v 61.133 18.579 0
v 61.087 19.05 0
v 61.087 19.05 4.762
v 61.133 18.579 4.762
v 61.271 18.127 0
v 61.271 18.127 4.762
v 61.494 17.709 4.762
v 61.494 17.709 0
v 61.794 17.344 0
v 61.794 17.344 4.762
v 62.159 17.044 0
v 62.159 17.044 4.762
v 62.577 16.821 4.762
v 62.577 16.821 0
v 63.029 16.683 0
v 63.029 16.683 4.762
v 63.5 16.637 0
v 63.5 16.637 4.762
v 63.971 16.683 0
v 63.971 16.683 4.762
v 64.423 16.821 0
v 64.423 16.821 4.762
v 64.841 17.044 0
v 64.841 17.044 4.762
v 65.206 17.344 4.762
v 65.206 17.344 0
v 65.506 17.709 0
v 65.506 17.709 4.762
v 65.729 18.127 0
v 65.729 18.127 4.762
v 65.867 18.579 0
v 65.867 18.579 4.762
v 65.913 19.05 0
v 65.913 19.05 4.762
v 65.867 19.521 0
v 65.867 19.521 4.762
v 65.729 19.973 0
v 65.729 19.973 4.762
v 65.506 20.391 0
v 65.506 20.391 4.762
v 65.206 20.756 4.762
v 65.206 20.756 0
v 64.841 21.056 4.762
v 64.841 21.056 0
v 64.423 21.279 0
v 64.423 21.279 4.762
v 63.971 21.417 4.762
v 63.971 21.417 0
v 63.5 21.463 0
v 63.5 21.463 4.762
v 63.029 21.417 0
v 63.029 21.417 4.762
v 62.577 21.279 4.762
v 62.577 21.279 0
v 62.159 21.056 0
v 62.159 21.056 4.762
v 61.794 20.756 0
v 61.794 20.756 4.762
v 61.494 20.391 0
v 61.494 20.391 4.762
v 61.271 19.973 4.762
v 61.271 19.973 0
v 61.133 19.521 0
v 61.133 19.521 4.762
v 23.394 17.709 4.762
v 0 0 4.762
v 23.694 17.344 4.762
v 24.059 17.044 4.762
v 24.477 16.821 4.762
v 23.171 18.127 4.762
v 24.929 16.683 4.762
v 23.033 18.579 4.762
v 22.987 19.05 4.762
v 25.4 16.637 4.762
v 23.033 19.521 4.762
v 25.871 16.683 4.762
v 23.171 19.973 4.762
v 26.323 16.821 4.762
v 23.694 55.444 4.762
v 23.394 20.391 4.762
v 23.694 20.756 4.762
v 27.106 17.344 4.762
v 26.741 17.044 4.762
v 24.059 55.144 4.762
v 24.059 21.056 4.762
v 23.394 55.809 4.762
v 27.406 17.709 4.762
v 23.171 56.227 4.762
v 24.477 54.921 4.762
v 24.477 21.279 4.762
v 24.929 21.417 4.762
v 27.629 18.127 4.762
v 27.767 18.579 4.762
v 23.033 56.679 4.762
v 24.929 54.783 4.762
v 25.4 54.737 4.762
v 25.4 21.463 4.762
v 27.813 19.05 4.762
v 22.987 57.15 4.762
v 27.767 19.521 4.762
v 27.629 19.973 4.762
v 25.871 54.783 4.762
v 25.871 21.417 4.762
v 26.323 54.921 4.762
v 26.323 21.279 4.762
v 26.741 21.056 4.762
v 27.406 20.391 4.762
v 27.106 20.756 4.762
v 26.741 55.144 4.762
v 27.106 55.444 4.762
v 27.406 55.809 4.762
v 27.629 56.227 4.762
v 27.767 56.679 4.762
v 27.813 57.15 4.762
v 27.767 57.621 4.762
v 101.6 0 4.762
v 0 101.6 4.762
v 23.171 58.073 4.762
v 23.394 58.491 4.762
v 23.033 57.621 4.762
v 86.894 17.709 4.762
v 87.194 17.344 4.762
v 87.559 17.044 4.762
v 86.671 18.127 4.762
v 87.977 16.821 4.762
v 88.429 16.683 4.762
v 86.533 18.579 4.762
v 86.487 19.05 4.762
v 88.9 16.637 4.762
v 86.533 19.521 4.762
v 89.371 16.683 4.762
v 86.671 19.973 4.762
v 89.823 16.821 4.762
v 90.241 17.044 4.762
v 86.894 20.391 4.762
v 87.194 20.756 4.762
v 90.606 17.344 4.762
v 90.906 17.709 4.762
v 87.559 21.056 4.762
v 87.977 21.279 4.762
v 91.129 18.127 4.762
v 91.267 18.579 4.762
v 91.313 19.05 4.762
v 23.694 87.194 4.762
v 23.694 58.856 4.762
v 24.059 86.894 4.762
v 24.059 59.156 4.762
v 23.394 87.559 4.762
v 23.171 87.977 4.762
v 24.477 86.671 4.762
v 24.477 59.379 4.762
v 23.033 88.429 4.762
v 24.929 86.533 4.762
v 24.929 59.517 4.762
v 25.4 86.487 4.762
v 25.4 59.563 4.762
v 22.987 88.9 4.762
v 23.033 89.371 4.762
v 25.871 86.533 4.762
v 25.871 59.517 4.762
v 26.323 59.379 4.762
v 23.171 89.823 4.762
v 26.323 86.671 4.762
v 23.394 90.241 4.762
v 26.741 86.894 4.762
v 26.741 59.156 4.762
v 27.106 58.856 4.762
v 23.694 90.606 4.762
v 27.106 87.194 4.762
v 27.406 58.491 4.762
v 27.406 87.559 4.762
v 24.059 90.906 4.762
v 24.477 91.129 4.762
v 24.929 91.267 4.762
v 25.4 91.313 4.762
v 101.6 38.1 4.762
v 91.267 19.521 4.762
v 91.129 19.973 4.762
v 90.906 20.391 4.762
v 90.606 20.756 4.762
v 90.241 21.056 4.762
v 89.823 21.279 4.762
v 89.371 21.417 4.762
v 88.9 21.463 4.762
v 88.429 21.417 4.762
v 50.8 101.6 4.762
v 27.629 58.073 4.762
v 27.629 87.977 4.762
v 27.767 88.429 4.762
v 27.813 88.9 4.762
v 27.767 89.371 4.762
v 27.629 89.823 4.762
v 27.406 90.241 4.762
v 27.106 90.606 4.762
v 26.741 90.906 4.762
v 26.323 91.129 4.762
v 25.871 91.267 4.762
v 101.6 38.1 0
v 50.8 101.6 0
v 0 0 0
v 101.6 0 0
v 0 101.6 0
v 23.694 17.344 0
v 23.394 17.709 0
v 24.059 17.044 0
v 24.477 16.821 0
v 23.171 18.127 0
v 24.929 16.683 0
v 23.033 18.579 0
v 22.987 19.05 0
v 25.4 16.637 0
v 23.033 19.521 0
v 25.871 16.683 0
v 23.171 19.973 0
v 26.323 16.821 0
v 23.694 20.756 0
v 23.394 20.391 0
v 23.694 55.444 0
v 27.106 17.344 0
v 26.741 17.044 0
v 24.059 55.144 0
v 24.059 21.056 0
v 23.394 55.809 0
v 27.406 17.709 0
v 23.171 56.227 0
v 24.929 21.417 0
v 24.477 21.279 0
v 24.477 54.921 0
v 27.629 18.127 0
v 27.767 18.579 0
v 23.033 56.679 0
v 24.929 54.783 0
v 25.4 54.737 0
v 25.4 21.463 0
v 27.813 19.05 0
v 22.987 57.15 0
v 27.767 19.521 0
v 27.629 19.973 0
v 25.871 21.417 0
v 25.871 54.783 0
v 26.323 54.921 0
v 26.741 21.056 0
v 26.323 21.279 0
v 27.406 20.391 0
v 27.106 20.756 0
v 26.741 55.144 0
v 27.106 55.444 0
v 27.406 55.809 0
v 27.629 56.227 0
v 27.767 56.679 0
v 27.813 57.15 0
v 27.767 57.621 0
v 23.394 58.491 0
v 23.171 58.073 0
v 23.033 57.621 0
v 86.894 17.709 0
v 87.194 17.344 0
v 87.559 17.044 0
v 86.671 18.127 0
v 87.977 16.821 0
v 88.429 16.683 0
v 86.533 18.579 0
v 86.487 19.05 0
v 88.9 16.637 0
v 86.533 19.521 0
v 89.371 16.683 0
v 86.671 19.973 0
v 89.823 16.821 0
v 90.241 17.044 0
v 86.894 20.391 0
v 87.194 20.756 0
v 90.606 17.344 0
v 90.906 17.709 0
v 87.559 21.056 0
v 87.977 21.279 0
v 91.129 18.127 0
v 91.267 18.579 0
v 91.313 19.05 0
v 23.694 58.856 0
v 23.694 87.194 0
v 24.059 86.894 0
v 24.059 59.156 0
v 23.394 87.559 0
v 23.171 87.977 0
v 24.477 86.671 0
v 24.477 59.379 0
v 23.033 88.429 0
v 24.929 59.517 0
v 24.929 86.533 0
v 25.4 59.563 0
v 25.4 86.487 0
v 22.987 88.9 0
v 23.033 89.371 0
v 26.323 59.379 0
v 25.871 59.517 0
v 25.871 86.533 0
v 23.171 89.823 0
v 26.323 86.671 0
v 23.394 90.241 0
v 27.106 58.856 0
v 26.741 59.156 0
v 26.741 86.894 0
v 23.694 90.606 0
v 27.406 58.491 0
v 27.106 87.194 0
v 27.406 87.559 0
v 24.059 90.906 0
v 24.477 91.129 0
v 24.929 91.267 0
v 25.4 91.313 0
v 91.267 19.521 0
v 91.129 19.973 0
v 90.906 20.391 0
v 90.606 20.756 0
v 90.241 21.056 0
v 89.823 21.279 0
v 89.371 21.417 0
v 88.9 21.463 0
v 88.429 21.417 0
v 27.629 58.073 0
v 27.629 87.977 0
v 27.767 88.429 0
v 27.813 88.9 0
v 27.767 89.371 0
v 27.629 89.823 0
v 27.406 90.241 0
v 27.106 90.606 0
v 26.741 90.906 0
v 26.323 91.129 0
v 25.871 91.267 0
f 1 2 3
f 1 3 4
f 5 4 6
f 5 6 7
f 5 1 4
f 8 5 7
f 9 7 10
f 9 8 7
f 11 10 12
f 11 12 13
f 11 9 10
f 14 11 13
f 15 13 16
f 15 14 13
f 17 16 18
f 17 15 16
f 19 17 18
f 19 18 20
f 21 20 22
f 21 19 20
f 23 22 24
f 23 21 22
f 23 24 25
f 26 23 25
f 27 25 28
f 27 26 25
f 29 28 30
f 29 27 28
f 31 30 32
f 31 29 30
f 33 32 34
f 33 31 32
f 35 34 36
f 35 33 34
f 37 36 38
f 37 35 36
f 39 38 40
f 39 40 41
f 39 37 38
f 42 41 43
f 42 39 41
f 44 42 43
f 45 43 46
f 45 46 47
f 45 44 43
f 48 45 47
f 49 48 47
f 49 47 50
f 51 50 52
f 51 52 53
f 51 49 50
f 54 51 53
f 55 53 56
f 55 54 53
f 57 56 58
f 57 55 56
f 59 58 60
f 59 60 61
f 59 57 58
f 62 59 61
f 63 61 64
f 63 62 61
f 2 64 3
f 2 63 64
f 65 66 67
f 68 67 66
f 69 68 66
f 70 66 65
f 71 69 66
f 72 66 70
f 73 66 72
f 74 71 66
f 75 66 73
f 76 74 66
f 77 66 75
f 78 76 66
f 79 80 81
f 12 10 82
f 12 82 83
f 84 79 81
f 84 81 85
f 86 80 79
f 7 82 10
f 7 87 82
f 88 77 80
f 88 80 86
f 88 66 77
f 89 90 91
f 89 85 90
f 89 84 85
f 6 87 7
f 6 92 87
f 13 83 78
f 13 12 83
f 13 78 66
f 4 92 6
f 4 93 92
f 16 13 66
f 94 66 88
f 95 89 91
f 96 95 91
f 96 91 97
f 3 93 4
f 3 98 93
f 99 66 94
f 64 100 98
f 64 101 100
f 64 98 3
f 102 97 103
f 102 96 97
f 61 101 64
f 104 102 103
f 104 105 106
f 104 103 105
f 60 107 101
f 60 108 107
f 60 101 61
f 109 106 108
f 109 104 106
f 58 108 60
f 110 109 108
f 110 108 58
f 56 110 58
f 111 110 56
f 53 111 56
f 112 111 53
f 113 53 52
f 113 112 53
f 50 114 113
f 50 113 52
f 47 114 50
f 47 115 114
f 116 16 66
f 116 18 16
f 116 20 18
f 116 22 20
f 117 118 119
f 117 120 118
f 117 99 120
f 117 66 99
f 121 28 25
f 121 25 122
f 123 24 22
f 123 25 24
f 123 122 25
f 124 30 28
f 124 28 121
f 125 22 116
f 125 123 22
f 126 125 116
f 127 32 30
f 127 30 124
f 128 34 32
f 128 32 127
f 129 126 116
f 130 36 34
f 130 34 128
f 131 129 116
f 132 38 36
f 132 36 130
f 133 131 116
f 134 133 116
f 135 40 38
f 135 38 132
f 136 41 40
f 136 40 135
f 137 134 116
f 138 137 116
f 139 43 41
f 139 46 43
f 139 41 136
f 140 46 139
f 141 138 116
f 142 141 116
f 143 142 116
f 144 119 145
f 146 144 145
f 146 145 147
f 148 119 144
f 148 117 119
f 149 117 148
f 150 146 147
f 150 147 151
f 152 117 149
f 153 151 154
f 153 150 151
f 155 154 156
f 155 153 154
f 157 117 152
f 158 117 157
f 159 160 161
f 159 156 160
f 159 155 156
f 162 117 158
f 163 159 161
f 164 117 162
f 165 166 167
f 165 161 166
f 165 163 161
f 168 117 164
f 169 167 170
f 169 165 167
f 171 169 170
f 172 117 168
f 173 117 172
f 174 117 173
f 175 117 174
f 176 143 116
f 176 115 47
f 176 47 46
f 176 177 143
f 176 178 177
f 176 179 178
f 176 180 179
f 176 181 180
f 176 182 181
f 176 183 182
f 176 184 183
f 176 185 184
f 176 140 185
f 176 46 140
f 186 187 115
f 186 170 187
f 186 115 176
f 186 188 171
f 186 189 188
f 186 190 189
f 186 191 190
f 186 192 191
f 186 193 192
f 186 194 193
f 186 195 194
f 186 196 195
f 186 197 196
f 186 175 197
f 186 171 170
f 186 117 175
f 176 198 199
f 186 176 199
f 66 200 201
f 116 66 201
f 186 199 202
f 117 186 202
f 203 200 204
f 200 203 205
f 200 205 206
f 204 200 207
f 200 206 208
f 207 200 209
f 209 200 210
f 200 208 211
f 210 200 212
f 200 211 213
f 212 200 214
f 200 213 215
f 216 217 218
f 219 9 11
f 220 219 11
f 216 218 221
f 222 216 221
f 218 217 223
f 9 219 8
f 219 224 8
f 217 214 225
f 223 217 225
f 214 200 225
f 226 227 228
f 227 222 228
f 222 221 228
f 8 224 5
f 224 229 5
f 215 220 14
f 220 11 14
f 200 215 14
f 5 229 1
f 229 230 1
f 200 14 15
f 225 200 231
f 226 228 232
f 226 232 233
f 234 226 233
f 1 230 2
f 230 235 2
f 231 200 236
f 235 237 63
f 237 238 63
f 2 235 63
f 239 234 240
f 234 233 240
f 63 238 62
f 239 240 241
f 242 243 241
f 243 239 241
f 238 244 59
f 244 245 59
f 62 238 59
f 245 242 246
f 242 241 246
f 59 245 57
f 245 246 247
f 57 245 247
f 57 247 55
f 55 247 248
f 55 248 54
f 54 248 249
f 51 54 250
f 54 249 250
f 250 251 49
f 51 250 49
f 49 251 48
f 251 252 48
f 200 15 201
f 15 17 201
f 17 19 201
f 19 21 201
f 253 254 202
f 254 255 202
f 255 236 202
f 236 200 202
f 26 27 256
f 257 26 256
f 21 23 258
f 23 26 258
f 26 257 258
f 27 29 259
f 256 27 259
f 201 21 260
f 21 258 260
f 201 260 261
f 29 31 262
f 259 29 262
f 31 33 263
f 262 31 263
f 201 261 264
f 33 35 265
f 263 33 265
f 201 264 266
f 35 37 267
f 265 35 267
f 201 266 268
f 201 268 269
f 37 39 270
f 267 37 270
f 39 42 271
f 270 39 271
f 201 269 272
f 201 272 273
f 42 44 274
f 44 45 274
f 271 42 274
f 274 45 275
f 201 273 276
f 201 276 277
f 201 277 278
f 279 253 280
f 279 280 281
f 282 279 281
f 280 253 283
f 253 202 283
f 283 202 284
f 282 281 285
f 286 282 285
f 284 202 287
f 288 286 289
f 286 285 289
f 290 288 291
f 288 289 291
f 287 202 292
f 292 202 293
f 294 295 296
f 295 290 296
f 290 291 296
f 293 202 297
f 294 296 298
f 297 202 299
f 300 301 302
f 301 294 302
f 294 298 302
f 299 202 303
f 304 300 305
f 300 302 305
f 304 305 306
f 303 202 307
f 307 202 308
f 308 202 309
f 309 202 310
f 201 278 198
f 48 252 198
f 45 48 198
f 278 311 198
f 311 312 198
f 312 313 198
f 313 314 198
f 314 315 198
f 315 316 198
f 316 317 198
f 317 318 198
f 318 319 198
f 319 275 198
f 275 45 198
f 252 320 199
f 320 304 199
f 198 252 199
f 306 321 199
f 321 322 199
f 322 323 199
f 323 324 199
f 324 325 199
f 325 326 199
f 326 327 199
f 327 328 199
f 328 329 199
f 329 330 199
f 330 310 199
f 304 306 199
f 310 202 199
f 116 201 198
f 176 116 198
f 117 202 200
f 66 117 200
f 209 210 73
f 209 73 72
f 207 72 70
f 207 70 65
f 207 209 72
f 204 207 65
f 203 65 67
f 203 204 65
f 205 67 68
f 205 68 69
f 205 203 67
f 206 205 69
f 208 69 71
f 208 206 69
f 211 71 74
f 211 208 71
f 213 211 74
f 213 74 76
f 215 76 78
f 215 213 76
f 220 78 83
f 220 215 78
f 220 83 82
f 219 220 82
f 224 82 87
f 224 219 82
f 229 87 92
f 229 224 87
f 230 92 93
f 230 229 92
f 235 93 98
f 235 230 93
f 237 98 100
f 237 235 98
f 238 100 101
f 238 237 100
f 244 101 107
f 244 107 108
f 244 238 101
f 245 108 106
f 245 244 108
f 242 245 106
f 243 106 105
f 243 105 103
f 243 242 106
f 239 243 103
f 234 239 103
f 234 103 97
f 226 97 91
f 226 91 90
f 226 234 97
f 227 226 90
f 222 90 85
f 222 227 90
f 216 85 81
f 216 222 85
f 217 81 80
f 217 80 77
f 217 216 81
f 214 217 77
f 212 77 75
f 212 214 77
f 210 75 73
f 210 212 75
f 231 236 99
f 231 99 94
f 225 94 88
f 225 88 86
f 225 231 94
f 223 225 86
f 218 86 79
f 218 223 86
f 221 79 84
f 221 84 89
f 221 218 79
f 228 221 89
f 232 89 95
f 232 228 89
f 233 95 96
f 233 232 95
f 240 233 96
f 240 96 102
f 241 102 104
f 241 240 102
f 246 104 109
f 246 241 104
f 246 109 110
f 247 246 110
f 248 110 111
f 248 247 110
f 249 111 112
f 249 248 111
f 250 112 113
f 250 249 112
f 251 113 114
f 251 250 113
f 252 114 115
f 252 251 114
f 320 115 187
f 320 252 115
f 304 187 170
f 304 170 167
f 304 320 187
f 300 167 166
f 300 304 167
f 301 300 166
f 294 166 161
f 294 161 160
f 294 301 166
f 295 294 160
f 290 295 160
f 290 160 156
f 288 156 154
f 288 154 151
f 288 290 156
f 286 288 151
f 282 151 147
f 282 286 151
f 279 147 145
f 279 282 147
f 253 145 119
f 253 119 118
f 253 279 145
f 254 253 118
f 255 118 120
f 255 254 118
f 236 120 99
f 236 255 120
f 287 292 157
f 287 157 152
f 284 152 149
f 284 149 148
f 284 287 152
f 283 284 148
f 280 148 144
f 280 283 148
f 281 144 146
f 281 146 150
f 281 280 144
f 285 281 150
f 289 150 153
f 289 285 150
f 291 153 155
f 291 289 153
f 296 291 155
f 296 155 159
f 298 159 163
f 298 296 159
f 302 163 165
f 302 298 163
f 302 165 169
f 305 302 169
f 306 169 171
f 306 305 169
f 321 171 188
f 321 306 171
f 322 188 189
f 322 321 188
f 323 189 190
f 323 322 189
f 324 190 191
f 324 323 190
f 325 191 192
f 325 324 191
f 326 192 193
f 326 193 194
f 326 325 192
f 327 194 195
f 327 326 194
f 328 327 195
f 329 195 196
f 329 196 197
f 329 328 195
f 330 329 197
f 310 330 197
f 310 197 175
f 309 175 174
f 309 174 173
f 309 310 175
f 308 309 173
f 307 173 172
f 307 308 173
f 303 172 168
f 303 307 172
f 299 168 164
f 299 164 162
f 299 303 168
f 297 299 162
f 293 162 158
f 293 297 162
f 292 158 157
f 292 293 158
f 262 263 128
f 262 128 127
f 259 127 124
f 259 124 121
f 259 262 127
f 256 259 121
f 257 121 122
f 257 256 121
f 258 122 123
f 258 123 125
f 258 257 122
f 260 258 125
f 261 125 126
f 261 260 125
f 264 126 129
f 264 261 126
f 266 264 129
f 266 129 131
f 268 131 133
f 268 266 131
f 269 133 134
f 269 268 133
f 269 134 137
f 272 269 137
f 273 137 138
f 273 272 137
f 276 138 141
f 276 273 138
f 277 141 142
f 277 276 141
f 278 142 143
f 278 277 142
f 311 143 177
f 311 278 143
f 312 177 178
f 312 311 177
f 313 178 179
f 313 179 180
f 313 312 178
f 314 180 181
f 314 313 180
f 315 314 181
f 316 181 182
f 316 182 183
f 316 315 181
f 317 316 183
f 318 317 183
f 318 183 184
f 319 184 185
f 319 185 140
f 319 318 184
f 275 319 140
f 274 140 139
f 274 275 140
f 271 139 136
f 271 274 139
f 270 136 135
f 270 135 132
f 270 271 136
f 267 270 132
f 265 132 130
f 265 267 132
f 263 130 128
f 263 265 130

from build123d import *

# Parameters (mm, degrees)
SKETCH1_R           = 2.413
BOSS_EXTRUDE1_DEPTH = 4.7625


with BuildPart() as part:
    # Sketch1 → Boss-Extrude1 (new body)
    with BuildSketch(Plane.XY):
        Polygon((101.6, 38.1), (50.8, 101.6), (0, 101.6), (0, 0), (101.6, 0), align=None)
        with Locations(Location((25.4, 19.05, 0), (0, 0, 180))):
            Circle(SKETCH1_R, mode=Mode.SUBTRACT)
        with Locations(Location((63.5, 19.05, 0), (0, 0, 180))):
            Circle(SKETCH1_R, mode=Mode.SUBTRACT)
        with Locations(Location((88.9, 19.05, 0), (0, 0, 180))):
            Circle(SKETCH1_R, mode=Mode.SUBTRACT)
        with Locations(Location((25.4, 57.15, 0), (0, 0, 180))):
            Circle(SKETCH1_R, mode=Mode.SUBTRACT)
        with Locations(Location((25.4, 88.9, 0), (0, 0, 180))):
            Circle(SKETCH1_R, mode=Mode.SUBTRACT)
    extrude(amount=BOSS_EXTRUDE1_DEPTH)


solid = part.part
